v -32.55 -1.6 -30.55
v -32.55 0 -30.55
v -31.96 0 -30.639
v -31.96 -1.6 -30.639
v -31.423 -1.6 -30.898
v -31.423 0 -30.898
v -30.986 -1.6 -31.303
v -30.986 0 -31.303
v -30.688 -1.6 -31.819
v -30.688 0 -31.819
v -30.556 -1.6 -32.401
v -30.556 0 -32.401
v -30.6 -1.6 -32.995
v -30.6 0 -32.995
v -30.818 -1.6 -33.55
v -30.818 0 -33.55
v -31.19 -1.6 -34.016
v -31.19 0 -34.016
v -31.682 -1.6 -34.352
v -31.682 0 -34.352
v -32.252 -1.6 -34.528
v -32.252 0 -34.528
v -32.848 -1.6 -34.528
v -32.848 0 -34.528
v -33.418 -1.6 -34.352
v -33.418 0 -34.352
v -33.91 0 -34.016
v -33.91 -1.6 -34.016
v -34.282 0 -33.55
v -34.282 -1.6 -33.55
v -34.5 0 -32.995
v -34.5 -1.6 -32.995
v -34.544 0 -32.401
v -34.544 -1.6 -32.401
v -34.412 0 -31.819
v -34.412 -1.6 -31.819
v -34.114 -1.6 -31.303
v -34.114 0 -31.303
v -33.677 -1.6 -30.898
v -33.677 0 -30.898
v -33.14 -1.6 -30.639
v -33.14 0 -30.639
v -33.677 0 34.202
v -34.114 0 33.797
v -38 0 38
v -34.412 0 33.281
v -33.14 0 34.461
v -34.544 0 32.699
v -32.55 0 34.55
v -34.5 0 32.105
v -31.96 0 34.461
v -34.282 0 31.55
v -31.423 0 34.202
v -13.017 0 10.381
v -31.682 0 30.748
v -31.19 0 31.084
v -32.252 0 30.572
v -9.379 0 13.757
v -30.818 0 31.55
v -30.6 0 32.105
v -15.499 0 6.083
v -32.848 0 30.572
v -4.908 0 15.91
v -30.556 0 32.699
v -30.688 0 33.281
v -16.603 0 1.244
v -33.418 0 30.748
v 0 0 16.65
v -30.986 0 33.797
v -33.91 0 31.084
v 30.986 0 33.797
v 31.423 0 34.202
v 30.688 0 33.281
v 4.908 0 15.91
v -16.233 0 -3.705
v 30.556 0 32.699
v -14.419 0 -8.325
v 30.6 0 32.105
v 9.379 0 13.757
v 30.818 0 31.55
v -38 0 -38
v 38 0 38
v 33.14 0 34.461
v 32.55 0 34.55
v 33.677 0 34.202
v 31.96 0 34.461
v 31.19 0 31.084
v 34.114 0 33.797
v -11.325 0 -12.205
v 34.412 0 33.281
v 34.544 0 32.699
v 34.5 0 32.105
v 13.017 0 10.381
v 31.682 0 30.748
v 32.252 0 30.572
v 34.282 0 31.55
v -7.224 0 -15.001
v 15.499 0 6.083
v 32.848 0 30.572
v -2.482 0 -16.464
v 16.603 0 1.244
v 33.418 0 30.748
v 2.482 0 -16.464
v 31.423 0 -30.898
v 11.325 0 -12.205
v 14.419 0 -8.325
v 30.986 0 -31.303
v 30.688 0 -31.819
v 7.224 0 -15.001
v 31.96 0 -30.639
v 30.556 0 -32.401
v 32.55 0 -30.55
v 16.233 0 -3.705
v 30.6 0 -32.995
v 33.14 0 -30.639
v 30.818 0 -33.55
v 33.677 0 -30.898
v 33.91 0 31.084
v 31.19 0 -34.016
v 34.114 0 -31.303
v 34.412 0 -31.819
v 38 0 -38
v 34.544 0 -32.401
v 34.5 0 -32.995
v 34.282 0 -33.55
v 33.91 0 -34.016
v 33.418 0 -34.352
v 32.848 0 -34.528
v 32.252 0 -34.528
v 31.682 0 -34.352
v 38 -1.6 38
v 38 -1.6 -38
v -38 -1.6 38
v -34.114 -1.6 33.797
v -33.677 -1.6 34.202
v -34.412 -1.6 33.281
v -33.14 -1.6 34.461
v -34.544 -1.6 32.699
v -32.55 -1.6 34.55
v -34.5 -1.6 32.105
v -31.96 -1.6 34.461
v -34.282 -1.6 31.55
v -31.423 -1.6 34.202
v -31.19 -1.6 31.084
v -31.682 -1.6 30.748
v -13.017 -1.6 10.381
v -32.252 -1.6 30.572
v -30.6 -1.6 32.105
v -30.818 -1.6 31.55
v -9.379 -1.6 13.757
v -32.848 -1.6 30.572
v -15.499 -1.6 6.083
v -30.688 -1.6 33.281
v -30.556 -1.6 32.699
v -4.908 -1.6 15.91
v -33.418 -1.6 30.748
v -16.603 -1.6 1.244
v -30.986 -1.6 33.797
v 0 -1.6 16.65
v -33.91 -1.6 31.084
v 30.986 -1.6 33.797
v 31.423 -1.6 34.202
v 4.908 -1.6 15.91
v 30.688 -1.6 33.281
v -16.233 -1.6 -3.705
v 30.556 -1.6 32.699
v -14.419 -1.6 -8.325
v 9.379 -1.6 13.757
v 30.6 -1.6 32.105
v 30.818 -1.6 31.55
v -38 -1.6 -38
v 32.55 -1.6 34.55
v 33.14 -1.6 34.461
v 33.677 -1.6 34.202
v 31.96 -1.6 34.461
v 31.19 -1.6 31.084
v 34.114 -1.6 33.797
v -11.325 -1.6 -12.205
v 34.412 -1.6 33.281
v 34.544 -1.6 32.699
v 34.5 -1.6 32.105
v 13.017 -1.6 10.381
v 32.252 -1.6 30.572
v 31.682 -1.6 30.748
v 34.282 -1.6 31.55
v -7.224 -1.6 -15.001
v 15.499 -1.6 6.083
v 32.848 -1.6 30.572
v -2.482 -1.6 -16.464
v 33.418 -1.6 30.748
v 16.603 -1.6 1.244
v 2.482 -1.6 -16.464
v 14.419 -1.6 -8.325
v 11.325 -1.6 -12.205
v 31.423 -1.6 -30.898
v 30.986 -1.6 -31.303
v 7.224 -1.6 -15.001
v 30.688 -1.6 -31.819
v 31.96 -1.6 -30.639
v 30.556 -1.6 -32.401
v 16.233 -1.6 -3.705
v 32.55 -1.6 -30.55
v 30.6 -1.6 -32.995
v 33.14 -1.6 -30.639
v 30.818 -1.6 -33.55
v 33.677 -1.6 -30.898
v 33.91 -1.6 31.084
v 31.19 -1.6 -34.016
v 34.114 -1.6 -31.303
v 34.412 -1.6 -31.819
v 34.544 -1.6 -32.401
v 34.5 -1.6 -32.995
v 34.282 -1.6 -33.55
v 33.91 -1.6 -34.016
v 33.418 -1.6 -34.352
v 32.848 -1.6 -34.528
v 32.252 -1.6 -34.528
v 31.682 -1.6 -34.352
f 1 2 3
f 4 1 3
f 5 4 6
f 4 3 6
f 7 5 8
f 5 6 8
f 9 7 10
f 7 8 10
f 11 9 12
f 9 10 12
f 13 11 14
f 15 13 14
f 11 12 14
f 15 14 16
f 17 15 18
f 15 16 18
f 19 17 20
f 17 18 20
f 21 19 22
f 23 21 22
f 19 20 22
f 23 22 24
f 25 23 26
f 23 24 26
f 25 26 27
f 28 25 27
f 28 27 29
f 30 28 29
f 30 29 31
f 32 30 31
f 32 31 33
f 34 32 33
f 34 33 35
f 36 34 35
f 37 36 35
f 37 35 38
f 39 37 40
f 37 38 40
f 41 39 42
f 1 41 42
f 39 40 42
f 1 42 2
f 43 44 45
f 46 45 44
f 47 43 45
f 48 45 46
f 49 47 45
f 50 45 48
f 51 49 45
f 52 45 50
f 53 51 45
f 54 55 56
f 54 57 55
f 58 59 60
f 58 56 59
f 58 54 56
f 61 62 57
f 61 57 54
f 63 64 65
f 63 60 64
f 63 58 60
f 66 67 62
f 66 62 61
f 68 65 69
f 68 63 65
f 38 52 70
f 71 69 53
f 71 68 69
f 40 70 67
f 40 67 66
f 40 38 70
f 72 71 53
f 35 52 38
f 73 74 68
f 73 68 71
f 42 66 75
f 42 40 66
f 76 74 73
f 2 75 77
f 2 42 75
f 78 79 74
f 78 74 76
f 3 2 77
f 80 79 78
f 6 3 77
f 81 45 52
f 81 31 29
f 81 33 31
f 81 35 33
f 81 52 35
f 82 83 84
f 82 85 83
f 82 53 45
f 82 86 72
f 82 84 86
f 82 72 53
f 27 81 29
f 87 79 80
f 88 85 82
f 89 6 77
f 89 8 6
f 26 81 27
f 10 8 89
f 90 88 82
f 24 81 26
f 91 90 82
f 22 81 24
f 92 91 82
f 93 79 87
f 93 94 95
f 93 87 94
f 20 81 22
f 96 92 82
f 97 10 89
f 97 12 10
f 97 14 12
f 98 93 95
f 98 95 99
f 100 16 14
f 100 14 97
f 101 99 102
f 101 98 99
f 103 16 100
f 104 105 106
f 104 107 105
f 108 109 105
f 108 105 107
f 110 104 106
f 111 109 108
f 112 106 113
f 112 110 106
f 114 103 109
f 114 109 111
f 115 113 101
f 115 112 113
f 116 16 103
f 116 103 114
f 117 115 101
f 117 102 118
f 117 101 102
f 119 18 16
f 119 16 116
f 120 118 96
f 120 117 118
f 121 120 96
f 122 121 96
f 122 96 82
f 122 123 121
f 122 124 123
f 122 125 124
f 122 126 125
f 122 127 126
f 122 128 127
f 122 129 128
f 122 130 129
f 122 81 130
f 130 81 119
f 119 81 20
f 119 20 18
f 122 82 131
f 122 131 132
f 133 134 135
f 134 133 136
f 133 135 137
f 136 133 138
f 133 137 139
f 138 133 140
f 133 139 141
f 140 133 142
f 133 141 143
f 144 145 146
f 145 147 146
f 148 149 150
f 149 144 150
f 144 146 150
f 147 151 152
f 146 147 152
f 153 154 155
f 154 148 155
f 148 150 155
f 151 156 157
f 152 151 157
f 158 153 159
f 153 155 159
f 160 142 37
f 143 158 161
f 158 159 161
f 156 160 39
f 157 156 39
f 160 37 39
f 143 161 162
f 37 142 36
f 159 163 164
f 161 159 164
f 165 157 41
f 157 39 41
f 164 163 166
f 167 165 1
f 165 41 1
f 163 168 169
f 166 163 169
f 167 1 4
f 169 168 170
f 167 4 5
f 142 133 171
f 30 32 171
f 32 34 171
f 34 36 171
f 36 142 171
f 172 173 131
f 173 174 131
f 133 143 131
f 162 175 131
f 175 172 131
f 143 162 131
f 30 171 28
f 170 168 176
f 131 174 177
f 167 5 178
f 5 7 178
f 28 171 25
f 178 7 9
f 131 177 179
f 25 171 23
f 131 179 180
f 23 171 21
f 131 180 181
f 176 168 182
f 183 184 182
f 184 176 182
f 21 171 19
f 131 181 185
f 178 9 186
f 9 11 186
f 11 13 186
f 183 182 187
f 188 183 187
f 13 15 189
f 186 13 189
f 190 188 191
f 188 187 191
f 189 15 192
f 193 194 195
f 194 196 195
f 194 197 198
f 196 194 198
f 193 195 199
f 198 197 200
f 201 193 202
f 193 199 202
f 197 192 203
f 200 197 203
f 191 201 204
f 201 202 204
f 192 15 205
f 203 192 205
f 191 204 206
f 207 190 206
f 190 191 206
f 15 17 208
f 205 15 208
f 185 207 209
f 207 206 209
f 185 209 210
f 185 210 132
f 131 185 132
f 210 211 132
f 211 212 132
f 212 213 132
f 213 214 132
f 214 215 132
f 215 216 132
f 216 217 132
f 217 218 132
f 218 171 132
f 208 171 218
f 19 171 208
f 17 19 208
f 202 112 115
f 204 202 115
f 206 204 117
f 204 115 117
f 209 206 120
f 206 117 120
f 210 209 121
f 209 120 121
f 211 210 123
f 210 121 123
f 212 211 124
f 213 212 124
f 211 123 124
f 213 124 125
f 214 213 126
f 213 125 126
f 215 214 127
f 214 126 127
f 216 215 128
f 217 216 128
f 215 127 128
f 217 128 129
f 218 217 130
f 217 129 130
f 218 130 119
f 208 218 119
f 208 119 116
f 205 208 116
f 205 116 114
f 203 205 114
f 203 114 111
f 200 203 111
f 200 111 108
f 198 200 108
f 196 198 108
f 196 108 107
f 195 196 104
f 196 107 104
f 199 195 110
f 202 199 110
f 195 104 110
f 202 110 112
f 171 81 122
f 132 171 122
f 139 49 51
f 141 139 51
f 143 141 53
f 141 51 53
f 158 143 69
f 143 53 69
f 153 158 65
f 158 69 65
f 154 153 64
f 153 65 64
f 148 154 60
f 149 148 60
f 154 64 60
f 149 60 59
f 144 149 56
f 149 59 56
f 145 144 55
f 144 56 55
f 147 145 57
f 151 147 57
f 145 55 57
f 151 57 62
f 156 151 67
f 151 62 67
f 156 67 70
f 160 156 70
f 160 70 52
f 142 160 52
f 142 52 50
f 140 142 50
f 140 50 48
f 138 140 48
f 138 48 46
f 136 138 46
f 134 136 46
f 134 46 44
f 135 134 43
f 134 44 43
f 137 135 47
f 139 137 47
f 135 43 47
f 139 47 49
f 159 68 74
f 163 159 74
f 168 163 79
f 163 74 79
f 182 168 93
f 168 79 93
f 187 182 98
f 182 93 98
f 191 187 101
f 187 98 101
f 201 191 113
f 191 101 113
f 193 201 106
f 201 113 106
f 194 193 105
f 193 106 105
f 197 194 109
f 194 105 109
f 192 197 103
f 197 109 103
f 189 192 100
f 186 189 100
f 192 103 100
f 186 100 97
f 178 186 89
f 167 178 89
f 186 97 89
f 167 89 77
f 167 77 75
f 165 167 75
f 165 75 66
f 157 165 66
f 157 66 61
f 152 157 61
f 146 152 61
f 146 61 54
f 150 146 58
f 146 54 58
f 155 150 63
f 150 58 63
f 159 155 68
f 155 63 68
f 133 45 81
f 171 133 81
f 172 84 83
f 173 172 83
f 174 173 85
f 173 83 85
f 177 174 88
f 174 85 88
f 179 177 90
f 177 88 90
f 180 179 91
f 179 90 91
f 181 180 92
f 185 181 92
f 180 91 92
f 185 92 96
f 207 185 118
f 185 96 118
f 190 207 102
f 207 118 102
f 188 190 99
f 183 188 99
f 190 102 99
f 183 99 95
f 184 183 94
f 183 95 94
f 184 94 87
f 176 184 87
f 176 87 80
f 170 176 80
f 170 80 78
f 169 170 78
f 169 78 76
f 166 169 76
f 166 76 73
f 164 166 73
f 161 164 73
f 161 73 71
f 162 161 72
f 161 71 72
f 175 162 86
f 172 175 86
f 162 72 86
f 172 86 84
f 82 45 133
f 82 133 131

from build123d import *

# Parameters (mm, degrees)
SKETCH1_W          = 76
SKETCH1_H          = 76
SKETCH1_R          = 2
SKETCH1_R_2        = 16.65
BASE_FLANGE1_DEPTH = 1.6


# Sheet-metal steps are written as plain solids
with BuildPart() as part:
    # Sketch1 → Base-Flange1 (new body)
    with BuildSketch(Plane(origin=(0, 0, 0), x_dir=(1, 0, 0), z_dir=(0, 1, 0))):
        Rectangle(SKETCH1_W, SKETCH1_H)
        with Locations(Location((32.55, 32.55, 0), (0, 0, 270))):
            Circle(SKETCH1_R, mode=Mode.SUBTRACT)
        with Locations(Location((0, 0, 0), (0, 0, 270))):
            Circle(SKETCH1_R_2, mode=Mode.SUBTRACT)
        with Locations(Location((32.55, -32.55, 0), (0, 0, 270))):
            Circle(SKETCH1_R, mode=Mode.SUBTRACT)
        with Locations(Location((-32.55, -32.55, 0), (0, 0, 270))):
            Circle(SKETCH1_R, mode=Mode.SUBTRACT)
        with Locations(Location((-32.55, 32.55, 0), (0, 0, 270))):
            Circle(SKETCH1_R, mode=Mode.SUBTRACT)
    extrude(amount=-BASE_FLANGE1_DEPTH)


solid = part.part
